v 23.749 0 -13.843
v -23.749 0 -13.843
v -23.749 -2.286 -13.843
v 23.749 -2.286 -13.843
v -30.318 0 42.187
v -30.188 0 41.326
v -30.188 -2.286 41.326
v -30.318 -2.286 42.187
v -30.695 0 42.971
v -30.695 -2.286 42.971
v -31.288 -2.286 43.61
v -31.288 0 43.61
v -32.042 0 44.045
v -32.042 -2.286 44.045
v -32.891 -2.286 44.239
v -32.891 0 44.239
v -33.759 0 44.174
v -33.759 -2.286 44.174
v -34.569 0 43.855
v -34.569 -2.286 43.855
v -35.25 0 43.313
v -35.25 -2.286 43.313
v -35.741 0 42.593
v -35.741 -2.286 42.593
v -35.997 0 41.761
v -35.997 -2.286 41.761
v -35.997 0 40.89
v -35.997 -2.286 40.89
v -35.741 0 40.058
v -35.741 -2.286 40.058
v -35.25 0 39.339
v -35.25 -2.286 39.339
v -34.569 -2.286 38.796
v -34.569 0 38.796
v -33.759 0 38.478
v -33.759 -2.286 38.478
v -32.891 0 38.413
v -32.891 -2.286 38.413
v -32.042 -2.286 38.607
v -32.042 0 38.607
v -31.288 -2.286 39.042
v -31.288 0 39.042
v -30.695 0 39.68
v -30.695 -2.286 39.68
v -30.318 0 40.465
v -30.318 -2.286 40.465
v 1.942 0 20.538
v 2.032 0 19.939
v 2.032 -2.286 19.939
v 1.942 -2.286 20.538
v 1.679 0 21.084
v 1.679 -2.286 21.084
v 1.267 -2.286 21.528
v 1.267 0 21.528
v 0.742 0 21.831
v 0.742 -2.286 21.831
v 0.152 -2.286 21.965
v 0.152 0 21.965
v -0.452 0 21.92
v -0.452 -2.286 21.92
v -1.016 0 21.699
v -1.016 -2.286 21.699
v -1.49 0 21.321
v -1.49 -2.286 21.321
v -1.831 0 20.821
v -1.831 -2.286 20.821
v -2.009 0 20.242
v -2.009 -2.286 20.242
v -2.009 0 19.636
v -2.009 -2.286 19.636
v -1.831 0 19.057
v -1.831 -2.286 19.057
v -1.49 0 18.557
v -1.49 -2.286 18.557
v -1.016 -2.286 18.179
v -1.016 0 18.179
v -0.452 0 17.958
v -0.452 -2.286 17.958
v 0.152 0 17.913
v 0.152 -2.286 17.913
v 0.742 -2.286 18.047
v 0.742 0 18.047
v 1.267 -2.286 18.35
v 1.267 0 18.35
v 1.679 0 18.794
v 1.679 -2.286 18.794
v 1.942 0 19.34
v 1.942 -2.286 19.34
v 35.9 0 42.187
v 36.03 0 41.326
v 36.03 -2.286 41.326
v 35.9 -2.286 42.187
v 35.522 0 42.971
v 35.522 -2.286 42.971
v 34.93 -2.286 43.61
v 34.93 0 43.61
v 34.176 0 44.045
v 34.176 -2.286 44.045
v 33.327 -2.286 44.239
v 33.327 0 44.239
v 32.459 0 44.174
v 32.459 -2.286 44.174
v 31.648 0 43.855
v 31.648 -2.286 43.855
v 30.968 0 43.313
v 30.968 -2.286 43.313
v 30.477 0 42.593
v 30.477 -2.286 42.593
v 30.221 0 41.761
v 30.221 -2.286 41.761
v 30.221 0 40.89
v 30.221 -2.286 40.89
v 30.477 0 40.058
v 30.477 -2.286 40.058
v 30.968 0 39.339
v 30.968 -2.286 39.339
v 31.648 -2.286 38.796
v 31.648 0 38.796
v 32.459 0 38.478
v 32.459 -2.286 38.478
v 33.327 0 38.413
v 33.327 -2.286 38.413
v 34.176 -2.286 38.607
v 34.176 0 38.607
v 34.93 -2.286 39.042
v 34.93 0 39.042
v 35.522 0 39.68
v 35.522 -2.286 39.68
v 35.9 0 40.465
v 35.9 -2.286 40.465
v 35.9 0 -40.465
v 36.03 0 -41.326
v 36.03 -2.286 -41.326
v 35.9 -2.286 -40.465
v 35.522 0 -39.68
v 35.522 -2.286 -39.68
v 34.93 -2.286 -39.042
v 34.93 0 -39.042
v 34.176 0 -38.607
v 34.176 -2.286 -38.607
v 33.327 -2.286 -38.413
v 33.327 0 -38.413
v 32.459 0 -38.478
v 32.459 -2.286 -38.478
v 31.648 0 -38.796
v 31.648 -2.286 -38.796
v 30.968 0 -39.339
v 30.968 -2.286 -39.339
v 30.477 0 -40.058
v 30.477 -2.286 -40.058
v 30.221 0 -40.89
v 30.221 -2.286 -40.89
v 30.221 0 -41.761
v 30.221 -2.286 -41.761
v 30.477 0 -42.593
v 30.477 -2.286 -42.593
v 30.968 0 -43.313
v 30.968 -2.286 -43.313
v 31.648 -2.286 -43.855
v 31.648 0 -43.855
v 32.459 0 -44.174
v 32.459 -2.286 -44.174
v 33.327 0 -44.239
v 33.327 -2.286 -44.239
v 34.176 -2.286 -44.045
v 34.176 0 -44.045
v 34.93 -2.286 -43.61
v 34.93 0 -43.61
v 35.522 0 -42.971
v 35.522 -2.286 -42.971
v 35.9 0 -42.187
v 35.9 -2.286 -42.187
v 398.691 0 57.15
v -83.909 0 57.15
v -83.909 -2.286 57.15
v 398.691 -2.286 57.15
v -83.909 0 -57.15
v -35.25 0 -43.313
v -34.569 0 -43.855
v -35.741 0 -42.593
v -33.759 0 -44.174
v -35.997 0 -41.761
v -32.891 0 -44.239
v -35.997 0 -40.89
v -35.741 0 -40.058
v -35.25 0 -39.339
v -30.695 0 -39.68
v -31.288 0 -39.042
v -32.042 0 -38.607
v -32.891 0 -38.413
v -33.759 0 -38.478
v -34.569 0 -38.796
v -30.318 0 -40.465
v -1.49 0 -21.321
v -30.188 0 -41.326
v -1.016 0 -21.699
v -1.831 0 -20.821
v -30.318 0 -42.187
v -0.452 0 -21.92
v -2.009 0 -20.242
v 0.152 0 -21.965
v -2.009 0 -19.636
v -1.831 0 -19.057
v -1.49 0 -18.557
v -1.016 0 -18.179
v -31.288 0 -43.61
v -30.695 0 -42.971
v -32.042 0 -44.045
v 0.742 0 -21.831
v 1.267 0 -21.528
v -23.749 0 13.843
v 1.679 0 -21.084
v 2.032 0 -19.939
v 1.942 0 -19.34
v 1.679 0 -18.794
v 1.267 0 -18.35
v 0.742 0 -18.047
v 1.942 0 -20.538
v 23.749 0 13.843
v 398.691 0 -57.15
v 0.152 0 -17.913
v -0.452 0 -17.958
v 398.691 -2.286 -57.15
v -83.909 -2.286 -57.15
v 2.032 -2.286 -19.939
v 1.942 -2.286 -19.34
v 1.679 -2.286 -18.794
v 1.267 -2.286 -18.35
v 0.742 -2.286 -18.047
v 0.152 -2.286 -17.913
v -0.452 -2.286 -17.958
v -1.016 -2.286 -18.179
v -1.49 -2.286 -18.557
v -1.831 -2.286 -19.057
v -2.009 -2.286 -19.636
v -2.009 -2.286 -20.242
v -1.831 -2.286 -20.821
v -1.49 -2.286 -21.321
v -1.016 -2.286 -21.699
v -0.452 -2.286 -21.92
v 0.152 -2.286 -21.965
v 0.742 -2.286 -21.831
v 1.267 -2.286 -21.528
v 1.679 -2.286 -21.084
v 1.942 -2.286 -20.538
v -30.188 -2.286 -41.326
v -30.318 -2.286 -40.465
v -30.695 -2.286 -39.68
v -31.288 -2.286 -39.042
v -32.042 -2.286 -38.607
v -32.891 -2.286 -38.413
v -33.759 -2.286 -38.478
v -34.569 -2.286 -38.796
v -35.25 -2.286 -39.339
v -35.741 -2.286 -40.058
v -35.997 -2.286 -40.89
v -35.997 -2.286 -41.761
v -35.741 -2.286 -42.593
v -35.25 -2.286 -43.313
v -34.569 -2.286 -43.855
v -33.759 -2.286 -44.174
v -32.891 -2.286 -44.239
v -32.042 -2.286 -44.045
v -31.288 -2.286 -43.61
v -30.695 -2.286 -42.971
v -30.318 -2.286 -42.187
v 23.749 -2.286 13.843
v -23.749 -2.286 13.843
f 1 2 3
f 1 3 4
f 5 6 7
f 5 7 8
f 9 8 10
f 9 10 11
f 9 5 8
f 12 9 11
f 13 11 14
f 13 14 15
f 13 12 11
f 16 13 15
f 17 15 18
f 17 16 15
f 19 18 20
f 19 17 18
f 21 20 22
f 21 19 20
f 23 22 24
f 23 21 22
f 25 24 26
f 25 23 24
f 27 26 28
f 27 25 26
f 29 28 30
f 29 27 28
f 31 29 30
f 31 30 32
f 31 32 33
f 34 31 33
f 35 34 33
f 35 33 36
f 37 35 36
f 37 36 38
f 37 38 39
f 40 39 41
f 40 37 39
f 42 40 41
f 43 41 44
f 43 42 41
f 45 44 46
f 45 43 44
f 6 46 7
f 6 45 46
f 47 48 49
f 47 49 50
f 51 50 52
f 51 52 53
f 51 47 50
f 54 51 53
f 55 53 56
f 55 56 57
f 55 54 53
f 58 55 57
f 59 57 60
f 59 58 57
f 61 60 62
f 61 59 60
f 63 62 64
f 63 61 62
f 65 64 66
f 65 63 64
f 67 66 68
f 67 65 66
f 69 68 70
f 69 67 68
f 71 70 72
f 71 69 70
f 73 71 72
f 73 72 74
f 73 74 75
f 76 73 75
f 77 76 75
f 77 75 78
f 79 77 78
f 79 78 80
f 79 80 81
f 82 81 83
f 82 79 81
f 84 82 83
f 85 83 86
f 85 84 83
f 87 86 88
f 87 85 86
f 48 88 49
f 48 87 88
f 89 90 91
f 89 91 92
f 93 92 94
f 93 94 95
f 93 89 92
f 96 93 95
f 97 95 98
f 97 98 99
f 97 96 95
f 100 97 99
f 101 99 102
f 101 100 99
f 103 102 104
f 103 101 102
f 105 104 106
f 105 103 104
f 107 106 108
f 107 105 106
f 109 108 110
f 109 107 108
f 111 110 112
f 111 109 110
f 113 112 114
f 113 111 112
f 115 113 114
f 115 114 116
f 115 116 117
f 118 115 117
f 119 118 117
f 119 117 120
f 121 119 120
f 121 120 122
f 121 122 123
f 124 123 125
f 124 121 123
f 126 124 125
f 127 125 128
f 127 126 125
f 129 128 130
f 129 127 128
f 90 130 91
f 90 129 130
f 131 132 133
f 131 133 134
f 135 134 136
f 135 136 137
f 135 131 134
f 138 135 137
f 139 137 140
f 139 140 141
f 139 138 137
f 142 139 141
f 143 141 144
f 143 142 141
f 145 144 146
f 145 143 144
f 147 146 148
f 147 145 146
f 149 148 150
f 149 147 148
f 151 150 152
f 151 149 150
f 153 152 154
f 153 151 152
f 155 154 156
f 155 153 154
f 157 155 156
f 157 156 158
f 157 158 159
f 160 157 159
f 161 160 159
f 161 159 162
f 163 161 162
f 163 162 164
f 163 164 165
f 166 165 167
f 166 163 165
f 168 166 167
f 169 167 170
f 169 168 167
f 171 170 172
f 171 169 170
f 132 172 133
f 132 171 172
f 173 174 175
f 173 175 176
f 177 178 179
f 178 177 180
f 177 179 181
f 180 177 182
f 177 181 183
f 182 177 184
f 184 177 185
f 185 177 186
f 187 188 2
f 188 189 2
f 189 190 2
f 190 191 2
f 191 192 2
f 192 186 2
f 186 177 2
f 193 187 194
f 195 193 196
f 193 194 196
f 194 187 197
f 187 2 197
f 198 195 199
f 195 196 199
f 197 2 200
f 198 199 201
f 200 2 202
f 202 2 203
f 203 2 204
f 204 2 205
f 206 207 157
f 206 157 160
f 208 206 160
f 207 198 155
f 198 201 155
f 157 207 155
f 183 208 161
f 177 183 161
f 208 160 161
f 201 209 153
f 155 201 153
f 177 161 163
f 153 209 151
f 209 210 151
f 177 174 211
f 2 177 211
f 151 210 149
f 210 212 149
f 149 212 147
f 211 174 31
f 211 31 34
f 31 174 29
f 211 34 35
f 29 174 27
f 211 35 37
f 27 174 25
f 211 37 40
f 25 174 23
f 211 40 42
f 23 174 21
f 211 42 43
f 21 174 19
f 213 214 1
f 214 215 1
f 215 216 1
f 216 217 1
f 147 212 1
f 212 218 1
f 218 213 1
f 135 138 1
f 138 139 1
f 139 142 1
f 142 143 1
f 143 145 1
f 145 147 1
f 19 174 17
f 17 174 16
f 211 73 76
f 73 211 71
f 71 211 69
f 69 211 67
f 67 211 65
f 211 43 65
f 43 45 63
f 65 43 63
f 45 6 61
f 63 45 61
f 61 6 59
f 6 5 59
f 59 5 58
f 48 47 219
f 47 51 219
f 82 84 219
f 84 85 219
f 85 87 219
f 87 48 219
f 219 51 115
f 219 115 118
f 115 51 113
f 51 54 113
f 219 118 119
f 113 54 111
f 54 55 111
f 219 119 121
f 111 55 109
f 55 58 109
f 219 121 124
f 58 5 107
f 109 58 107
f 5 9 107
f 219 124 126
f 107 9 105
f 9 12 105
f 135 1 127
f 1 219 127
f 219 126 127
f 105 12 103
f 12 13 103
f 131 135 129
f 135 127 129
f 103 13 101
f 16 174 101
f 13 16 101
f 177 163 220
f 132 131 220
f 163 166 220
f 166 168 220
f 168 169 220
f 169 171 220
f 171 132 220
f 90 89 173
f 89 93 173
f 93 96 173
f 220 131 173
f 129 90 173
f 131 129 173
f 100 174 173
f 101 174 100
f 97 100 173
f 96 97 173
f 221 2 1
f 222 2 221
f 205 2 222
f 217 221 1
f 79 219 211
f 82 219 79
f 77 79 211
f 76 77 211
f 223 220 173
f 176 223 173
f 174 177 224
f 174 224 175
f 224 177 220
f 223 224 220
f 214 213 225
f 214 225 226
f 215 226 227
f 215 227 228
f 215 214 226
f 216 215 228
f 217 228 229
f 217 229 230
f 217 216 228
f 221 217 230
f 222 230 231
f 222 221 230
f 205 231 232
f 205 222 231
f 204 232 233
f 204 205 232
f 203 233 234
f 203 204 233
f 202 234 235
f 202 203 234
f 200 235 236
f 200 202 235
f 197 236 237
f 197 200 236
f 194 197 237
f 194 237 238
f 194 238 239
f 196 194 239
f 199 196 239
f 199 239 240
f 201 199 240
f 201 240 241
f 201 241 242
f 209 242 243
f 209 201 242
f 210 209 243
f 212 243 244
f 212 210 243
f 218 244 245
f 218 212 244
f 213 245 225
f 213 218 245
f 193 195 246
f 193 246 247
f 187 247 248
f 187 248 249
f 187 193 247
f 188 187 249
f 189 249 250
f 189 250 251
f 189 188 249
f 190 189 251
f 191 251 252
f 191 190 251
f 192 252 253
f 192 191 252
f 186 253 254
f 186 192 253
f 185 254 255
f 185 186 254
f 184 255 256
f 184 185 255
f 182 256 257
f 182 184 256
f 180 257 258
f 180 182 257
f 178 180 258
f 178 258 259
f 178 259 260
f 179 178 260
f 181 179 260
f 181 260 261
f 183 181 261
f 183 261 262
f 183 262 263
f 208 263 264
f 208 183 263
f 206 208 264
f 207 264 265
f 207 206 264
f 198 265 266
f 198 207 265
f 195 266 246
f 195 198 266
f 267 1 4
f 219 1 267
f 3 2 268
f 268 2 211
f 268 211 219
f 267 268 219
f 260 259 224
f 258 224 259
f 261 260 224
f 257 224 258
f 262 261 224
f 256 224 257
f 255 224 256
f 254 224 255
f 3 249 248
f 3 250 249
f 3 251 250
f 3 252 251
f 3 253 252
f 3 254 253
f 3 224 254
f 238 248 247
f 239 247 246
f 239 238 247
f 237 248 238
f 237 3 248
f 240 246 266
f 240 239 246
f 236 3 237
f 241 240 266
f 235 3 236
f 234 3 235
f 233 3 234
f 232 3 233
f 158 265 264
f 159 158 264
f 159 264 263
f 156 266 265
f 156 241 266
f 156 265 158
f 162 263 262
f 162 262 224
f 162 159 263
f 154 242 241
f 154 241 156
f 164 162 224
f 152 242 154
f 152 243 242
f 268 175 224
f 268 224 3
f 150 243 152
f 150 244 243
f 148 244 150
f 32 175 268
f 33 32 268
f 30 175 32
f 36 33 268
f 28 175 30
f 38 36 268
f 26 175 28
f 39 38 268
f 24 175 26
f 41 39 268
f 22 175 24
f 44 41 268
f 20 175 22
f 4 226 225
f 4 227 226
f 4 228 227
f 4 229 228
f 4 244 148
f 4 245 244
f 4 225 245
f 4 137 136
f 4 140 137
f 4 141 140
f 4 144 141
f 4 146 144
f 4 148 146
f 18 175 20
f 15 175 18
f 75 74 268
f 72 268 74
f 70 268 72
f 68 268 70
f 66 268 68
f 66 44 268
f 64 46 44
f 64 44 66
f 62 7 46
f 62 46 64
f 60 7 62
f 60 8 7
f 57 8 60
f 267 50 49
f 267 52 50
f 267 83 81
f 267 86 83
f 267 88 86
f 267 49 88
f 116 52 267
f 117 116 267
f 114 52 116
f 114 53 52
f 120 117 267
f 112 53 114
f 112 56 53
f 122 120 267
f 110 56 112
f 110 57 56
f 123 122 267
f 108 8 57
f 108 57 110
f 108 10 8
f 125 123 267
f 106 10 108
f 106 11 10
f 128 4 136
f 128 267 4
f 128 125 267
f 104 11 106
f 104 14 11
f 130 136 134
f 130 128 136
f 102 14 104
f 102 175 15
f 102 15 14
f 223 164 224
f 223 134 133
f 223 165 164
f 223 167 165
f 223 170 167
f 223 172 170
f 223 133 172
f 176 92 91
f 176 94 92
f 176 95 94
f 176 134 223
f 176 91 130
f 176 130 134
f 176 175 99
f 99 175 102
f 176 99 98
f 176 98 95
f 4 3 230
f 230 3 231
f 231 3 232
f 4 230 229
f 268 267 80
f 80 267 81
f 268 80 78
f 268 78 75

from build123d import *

# Parameters (mm, degrees)
F0_W     = 482.6
F0_H     = 114.3
F0_R     = 2.921
F0_R_2   = 2.032
F0_W_2   = 47.498
F0_H_2   = 27.686
F1_DEPTH = 2.286


with BuildPart() as f1:
    # F0 (on Front) → F1 (new body)
    with BuildSketch(Plane.XZ):
        with Locations((157.3911, 0)):
            Rectangle(F0_W, F0_H)
        with Locations((-33.1089, -41.3258)):
            Circle(F0_R, mode=Mode.SUBTRACT)
        with Locations((33.1089, -41.3258)):
            Circle(F0_R, mode=Mode.SUBTRACT)
        with Locations((0, -19.939)):
            Circle(F0_R_2, mode=Mode.SUBTRACT)
        Rectangle(F0_W_2, F0_H_2, mode=Mode.SUBTRACT)
        with Locations((0, 19.939)):
            Circle(F0_R_2, mode=Mode.SUBTRACT)
        with Locations((-33.1089, 41.3258)):
            Circle(F0_R, mode=Mode.SUBTRACT)
        with Locations((33.1089, 41.3258)):
            Circle(F0_R, mode=Mode.SUBTRACT)
    extrude(amount=F1_DEPTH)


solid = f1.part
